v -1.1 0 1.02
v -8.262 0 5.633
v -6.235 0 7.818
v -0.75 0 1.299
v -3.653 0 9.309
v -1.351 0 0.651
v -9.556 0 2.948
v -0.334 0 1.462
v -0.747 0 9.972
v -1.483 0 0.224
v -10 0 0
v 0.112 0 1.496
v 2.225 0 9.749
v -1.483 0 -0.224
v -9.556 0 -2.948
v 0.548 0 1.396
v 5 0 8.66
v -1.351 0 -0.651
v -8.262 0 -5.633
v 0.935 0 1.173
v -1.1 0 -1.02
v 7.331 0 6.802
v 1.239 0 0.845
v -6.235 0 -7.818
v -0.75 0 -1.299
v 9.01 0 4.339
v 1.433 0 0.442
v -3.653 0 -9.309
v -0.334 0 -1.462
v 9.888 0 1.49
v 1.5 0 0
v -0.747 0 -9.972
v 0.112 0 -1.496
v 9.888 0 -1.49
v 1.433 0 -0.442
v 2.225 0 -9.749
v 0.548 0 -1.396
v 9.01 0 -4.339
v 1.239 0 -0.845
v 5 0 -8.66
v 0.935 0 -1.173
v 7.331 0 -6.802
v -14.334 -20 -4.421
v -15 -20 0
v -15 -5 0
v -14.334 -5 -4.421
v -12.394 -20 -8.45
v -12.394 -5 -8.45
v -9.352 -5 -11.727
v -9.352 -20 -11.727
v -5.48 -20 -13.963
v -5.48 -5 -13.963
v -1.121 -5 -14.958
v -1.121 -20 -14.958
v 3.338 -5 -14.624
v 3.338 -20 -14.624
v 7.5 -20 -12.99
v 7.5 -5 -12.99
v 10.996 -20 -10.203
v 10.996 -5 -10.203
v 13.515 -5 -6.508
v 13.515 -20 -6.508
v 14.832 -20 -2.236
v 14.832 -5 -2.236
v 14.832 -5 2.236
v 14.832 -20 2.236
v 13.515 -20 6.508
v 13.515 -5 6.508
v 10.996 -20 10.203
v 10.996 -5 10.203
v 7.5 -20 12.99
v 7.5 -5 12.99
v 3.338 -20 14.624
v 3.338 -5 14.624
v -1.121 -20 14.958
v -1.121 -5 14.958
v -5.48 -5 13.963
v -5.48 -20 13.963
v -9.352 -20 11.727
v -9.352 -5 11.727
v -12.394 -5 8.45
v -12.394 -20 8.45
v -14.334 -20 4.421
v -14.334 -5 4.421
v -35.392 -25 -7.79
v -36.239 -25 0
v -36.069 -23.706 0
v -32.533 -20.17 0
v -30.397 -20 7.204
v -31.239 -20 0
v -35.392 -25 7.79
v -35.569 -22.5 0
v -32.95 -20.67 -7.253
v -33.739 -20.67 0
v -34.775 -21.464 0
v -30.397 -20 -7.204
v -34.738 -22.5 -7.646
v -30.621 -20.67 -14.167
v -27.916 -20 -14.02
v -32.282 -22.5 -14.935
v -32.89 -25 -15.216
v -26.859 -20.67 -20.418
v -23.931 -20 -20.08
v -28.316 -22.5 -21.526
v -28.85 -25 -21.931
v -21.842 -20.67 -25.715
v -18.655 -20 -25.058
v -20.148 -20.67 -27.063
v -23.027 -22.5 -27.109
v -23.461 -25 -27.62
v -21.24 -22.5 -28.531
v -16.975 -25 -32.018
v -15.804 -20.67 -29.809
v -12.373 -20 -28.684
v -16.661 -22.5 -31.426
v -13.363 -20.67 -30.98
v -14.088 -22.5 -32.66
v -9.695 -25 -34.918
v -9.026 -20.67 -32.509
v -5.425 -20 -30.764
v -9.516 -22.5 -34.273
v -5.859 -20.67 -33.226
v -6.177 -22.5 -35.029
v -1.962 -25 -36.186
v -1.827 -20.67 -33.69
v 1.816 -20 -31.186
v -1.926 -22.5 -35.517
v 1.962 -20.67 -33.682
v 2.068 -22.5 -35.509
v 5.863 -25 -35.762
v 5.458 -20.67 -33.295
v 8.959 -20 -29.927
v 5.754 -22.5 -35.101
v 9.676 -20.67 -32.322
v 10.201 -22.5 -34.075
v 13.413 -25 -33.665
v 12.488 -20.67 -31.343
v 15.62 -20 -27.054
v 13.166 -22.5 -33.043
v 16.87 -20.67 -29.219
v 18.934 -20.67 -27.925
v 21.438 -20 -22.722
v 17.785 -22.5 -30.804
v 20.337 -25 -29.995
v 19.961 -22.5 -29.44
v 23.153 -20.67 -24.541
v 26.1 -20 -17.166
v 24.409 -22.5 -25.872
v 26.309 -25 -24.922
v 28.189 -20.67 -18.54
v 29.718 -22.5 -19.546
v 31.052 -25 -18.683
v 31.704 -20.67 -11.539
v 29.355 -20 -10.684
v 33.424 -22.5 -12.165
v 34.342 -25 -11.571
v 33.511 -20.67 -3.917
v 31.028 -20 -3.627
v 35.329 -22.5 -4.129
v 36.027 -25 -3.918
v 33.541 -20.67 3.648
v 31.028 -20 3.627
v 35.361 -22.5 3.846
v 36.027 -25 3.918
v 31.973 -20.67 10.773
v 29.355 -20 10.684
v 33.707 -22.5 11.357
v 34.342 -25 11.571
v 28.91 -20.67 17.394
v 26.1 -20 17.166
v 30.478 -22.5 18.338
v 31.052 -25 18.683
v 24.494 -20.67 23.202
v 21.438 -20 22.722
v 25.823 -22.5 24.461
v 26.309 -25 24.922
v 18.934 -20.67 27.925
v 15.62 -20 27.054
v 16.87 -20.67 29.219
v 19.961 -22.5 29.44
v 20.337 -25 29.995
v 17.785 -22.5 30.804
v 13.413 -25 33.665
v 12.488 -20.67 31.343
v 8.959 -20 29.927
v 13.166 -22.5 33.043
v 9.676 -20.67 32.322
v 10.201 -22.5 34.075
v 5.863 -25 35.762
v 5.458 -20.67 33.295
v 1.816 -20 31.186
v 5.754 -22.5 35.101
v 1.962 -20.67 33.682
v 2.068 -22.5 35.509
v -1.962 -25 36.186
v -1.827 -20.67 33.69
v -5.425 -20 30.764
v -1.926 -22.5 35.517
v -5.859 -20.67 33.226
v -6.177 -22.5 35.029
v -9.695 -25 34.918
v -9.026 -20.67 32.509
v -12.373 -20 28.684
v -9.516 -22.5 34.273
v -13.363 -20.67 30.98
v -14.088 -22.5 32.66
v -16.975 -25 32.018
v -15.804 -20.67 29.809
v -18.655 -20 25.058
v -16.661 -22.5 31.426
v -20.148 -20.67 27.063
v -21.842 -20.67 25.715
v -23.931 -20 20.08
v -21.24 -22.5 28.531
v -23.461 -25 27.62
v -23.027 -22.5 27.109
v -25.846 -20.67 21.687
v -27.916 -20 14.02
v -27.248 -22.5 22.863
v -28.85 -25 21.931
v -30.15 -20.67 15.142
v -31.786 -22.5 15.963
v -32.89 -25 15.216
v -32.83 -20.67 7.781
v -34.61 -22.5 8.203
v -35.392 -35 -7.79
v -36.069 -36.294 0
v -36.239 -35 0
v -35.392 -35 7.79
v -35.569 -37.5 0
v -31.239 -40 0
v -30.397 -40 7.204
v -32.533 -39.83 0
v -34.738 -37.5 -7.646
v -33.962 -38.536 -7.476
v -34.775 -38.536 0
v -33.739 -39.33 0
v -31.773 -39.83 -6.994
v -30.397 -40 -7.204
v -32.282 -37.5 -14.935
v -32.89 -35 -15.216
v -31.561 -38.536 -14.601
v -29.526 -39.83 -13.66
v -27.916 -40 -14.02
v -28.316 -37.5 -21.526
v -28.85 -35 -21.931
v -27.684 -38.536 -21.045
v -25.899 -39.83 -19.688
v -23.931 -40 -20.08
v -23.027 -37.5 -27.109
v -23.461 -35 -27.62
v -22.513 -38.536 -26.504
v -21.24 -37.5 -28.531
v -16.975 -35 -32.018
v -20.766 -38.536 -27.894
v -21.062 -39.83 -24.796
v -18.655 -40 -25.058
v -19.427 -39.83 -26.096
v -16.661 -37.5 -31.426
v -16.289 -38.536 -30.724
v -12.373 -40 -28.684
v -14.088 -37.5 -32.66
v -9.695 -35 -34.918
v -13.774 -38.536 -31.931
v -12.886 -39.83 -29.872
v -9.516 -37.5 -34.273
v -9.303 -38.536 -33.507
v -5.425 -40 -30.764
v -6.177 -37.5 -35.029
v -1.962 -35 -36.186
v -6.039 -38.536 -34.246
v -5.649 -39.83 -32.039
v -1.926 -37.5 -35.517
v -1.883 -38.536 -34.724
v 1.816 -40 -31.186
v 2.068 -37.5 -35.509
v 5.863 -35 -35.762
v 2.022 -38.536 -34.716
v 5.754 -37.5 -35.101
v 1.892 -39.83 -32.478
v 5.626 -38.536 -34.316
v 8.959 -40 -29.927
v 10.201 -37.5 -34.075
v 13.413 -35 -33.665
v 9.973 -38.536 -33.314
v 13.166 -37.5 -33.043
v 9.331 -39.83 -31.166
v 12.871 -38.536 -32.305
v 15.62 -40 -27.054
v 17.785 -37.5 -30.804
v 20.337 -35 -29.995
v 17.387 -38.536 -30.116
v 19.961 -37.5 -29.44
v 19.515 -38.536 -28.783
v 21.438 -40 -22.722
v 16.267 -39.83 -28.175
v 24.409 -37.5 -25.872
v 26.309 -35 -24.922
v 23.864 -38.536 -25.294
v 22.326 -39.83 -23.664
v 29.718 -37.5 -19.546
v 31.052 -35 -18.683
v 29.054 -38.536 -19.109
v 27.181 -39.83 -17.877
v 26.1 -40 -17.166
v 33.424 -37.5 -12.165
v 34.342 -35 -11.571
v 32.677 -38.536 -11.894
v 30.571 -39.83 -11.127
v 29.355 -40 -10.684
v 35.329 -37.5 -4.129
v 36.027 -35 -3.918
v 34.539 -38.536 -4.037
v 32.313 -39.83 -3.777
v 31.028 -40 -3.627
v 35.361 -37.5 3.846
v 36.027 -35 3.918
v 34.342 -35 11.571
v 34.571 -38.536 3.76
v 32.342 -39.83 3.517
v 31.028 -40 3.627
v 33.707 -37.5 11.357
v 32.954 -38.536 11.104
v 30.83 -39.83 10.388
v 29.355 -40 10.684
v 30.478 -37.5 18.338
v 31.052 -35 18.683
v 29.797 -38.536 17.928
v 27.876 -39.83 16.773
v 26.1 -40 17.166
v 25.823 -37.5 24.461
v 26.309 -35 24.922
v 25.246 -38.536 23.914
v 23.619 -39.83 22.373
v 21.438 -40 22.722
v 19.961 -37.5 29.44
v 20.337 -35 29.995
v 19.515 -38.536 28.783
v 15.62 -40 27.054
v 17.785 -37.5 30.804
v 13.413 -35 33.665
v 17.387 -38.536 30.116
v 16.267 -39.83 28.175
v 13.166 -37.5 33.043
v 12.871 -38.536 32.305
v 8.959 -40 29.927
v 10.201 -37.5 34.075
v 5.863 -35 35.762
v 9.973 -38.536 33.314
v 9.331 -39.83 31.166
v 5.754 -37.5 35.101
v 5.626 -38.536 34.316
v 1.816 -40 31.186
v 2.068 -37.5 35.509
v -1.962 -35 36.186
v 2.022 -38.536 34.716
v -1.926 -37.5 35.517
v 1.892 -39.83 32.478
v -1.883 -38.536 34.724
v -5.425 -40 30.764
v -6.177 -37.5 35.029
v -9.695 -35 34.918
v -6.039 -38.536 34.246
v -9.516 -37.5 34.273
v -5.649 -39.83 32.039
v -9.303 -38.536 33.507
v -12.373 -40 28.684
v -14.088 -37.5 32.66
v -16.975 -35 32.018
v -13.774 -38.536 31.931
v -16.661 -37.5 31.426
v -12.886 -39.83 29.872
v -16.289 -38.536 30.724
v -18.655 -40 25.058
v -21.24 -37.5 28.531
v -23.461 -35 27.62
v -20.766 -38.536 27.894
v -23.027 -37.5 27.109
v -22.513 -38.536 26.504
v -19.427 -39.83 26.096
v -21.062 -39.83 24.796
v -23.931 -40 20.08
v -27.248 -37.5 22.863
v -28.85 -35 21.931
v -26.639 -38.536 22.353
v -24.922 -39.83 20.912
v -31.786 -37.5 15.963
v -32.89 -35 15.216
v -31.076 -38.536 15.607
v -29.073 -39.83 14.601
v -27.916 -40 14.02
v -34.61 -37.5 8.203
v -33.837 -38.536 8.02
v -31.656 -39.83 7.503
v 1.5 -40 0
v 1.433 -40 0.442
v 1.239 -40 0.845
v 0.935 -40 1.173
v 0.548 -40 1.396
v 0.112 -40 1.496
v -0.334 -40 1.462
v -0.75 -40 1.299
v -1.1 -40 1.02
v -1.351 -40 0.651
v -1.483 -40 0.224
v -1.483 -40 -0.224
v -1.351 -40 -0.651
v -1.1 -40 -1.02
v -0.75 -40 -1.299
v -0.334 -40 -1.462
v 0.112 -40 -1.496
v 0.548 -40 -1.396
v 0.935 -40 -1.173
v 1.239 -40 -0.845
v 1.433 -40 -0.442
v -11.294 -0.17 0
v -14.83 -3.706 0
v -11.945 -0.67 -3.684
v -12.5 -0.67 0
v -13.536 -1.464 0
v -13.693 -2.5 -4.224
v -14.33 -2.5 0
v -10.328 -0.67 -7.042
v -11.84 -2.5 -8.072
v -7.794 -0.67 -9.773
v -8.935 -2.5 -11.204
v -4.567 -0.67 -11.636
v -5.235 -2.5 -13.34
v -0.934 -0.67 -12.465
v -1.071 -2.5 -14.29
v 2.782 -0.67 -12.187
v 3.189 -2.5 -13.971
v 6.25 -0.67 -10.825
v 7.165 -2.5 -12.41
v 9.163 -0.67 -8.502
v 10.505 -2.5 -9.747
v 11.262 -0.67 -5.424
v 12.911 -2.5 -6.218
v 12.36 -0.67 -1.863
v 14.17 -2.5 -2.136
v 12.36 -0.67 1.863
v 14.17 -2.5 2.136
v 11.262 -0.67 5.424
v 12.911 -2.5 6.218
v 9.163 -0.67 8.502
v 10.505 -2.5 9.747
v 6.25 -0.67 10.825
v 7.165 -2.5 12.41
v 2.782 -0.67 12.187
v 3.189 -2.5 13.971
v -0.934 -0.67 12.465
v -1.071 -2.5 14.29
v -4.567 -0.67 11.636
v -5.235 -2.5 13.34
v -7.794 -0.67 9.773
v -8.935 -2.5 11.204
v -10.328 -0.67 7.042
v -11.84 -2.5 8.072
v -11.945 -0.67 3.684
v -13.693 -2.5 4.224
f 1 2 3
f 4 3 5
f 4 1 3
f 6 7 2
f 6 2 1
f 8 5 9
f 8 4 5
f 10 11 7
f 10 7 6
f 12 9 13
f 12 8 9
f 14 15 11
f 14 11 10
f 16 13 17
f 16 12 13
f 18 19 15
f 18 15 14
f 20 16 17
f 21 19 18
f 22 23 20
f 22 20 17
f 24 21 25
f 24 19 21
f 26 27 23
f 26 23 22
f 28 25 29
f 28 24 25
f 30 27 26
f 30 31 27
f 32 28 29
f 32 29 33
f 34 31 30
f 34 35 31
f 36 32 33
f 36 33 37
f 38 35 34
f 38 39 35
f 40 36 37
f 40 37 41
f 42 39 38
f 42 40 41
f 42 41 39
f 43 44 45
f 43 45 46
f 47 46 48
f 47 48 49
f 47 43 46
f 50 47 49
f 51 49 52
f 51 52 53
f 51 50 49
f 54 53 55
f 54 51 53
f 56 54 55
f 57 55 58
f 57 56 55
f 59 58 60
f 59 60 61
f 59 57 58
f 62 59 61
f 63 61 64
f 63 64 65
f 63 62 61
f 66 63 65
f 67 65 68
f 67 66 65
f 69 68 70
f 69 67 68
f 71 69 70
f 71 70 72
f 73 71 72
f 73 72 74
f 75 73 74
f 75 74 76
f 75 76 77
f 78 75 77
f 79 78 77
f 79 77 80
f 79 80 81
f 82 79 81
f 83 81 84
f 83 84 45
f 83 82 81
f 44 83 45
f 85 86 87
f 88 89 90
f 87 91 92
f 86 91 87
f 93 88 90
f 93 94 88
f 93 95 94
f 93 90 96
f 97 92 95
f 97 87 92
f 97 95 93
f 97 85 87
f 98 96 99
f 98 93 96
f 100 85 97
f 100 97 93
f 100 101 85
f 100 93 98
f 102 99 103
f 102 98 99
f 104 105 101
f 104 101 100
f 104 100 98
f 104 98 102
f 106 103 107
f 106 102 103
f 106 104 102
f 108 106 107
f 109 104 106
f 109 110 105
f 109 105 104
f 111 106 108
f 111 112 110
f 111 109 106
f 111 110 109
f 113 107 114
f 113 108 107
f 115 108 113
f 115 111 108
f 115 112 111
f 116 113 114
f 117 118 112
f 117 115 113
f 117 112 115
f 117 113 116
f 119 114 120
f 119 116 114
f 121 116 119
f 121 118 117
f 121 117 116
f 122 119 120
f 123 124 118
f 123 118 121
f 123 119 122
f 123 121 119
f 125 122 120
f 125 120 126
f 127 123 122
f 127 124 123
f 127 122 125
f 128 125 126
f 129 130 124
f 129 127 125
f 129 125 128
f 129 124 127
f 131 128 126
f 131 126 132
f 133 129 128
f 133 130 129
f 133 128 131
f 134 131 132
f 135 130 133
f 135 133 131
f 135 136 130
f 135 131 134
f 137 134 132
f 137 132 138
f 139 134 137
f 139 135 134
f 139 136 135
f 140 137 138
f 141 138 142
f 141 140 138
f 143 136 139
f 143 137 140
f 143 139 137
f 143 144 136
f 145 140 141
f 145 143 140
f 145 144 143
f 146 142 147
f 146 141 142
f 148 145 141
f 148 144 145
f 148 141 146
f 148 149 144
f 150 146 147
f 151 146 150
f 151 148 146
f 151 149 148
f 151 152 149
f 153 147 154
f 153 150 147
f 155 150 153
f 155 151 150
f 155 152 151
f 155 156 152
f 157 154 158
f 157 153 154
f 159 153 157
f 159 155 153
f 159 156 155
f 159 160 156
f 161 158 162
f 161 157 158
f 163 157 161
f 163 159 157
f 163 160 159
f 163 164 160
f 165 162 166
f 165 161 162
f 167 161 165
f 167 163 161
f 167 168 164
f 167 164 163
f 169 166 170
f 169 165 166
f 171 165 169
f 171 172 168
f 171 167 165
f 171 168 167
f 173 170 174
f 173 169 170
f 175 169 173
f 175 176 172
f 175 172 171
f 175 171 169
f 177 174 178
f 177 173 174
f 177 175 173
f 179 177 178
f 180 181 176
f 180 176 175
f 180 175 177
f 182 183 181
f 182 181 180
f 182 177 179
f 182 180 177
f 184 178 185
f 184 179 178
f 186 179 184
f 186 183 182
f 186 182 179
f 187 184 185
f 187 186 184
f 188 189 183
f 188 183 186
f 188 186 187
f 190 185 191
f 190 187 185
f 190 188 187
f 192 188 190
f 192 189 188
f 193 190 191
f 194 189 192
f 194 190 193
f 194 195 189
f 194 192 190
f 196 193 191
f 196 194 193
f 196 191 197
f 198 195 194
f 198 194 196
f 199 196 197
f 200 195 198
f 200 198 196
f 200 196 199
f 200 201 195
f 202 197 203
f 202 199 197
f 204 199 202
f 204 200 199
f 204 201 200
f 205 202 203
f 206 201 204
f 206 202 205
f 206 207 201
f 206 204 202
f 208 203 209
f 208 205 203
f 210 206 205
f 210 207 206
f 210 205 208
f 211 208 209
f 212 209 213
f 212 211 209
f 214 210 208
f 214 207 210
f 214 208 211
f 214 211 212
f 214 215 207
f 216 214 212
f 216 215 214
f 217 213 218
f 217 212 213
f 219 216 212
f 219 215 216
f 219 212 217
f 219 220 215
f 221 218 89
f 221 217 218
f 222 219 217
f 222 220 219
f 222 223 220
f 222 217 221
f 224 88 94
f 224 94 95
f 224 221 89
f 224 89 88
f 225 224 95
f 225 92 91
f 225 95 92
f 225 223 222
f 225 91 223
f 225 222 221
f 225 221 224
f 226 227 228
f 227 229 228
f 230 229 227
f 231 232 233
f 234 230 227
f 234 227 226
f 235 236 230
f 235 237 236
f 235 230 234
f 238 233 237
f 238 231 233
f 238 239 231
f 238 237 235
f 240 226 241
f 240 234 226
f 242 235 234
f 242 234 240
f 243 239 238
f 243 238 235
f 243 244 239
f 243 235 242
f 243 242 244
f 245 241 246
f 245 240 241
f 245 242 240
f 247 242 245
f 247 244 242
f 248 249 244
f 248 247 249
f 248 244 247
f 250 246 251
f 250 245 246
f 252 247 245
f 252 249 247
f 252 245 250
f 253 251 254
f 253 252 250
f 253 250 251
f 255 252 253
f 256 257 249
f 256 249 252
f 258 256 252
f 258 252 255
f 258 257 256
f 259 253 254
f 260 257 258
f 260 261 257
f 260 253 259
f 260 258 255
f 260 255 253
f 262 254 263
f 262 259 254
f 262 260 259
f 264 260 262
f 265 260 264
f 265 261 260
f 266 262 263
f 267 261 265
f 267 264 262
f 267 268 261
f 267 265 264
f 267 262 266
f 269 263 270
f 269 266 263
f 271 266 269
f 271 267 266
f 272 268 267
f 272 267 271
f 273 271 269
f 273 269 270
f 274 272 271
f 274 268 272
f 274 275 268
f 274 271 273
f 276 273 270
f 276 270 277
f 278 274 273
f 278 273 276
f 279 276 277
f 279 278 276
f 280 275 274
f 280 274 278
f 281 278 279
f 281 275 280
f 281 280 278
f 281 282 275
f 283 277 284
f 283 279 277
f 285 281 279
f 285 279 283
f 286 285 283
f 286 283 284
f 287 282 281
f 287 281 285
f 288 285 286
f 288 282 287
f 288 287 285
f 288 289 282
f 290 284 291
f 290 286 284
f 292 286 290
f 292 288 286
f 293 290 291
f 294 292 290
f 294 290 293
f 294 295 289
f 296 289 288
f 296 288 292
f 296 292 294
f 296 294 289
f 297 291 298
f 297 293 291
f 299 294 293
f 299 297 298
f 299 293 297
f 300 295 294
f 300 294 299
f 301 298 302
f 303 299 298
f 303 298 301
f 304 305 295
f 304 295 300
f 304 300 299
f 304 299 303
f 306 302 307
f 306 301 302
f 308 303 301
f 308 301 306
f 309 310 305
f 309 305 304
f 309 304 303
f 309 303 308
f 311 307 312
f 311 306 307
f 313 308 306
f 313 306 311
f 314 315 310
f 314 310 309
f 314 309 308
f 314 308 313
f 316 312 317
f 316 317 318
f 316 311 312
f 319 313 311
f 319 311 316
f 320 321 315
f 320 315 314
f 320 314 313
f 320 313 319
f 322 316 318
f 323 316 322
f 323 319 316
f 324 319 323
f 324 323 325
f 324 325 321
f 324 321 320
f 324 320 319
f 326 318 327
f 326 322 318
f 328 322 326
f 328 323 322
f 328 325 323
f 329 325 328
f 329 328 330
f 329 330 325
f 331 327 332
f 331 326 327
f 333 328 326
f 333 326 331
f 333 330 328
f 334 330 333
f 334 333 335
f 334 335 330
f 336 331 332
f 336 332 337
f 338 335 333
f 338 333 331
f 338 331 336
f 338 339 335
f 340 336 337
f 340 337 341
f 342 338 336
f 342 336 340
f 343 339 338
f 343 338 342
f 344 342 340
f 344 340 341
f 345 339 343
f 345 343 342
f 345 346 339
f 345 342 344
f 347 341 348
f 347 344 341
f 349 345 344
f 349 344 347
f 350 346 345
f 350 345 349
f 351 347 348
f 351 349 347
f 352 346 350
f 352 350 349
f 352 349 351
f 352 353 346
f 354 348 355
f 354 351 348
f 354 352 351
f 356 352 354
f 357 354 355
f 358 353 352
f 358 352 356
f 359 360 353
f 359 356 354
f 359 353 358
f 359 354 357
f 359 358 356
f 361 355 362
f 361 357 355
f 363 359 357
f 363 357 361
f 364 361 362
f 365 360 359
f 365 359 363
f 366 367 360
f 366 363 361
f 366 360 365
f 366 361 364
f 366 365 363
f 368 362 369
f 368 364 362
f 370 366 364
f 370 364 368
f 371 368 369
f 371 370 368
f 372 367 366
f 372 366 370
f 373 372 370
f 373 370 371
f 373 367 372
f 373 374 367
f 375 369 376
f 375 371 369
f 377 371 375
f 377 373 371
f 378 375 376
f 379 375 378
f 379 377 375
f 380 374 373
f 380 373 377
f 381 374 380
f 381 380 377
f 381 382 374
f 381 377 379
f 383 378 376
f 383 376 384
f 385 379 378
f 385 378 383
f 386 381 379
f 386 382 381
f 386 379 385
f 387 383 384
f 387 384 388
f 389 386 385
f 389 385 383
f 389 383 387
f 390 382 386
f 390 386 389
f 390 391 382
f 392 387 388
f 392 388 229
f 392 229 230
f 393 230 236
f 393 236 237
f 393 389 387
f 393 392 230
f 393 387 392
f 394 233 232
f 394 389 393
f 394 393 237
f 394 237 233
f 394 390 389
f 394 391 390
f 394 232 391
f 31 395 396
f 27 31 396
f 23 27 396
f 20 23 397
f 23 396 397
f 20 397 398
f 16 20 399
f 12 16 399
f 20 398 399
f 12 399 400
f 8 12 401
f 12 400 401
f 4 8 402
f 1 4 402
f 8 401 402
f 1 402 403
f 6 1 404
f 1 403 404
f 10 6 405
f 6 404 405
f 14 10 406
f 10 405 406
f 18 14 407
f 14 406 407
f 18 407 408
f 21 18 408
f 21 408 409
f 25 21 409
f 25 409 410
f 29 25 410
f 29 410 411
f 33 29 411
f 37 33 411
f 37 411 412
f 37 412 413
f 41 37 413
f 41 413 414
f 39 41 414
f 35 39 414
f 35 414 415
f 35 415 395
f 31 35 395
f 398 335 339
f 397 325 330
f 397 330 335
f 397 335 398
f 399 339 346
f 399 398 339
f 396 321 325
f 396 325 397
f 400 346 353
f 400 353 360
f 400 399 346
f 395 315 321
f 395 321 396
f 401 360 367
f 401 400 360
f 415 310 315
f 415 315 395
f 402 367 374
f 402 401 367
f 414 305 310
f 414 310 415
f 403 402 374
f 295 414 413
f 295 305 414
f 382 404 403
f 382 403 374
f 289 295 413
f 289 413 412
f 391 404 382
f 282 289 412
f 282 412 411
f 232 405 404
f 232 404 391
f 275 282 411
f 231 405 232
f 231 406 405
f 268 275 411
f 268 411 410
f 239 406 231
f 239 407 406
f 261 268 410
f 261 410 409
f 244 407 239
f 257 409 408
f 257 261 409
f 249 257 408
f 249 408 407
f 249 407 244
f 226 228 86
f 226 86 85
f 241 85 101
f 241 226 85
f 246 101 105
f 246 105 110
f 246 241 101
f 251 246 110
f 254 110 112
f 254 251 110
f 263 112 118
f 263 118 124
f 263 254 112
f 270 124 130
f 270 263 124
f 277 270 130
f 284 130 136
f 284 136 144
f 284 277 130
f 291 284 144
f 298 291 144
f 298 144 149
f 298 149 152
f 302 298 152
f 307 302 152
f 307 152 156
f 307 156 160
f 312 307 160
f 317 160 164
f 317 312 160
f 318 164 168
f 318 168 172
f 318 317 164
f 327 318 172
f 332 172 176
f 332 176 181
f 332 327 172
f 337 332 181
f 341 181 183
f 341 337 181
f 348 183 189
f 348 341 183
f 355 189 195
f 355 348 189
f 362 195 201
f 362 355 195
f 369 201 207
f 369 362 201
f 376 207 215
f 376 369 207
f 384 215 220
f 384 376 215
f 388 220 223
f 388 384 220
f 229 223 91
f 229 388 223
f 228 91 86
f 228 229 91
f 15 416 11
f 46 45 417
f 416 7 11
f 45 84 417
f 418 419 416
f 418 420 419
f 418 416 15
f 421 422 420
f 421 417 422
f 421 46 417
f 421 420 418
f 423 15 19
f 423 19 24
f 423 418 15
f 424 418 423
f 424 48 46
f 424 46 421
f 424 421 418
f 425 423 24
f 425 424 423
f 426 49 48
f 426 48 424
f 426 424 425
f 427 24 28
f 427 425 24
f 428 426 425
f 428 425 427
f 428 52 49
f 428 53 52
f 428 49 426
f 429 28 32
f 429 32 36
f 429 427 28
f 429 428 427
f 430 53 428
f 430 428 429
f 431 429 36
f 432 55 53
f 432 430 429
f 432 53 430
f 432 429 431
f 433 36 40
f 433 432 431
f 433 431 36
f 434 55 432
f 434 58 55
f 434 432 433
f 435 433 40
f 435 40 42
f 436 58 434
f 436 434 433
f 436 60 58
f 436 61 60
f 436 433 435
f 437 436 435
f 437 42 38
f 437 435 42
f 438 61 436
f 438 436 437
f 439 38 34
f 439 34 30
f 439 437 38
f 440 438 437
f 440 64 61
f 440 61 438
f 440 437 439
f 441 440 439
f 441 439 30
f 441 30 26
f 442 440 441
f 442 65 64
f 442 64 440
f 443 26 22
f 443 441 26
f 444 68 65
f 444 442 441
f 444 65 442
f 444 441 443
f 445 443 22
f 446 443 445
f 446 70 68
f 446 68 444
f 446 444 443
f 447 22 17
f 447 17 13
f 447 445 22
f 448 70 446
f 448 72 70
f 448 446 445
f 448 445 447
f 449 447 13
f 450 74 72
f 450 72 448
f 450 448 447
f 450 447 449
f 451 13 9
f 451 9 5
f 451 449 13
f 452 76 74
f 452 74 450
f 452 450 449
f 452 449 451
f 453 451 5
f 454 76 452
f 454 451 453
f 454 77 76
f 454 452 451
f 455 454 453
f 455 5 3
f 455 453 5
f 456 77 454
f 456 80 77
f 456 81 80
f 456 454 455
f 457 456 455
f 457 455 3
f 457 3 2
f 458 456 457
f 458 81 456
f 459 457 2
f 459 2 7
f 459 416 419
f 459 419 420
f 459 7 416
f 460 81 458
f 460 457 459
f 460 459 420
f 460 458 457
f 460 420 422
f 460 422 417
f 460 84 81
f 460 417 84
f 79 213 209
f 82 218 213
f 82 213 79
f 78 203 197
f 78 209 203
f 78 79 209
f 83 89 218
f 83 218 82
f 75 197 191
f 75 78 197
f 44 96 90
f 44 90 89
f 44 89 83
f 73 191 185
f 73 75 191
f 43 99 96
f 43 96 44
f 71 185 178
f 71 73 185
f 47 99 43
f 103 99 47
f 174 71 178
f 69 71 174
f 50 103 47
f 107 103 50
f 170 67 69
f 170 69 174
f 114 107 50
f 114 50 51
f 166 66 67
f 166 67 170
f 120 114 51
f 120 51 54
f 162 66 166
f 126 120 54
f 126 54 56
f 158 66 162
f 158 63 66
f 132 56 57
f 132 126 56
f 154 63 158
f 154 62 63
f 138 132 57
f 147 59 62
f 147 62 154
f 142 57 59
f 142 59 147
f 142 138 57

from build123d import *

# Parameters (mm, degrees)
F2_R     = 5
F3_R     = 1.5
F4_DEPTH = 70.5


with BuildPart() as f1:
    # F0 (on Top) → F1 (revolve)
    with BuildSketch(Plane.XY):
        Polygon((0, -40), (0, 0), (-15, 0), (-15, -20), (-36.239058, -20), (-36.239058, -40), align=None)
    revolve(axis=Axis((0, -11.717667, 0), (0, -1, 0)))

    # F2
    f2_edges = [f1.edges().sort_by_distance(p)[0] for p in [
        (15, 0, 0),
        (36.239058, -20, 0),
        (36.239058, -40, 0),
    ]]
    fillet(f2_edges, radius=F2_R)

    # F3 (on face) → F4 (cut)
    with BuildSketch(Plane.XZ.offset(40)):
        Circle(F3_R)
    extrude(amount=-F4_DEPTH, mode=Mode.SUBTRACT)


solid = f1.part
